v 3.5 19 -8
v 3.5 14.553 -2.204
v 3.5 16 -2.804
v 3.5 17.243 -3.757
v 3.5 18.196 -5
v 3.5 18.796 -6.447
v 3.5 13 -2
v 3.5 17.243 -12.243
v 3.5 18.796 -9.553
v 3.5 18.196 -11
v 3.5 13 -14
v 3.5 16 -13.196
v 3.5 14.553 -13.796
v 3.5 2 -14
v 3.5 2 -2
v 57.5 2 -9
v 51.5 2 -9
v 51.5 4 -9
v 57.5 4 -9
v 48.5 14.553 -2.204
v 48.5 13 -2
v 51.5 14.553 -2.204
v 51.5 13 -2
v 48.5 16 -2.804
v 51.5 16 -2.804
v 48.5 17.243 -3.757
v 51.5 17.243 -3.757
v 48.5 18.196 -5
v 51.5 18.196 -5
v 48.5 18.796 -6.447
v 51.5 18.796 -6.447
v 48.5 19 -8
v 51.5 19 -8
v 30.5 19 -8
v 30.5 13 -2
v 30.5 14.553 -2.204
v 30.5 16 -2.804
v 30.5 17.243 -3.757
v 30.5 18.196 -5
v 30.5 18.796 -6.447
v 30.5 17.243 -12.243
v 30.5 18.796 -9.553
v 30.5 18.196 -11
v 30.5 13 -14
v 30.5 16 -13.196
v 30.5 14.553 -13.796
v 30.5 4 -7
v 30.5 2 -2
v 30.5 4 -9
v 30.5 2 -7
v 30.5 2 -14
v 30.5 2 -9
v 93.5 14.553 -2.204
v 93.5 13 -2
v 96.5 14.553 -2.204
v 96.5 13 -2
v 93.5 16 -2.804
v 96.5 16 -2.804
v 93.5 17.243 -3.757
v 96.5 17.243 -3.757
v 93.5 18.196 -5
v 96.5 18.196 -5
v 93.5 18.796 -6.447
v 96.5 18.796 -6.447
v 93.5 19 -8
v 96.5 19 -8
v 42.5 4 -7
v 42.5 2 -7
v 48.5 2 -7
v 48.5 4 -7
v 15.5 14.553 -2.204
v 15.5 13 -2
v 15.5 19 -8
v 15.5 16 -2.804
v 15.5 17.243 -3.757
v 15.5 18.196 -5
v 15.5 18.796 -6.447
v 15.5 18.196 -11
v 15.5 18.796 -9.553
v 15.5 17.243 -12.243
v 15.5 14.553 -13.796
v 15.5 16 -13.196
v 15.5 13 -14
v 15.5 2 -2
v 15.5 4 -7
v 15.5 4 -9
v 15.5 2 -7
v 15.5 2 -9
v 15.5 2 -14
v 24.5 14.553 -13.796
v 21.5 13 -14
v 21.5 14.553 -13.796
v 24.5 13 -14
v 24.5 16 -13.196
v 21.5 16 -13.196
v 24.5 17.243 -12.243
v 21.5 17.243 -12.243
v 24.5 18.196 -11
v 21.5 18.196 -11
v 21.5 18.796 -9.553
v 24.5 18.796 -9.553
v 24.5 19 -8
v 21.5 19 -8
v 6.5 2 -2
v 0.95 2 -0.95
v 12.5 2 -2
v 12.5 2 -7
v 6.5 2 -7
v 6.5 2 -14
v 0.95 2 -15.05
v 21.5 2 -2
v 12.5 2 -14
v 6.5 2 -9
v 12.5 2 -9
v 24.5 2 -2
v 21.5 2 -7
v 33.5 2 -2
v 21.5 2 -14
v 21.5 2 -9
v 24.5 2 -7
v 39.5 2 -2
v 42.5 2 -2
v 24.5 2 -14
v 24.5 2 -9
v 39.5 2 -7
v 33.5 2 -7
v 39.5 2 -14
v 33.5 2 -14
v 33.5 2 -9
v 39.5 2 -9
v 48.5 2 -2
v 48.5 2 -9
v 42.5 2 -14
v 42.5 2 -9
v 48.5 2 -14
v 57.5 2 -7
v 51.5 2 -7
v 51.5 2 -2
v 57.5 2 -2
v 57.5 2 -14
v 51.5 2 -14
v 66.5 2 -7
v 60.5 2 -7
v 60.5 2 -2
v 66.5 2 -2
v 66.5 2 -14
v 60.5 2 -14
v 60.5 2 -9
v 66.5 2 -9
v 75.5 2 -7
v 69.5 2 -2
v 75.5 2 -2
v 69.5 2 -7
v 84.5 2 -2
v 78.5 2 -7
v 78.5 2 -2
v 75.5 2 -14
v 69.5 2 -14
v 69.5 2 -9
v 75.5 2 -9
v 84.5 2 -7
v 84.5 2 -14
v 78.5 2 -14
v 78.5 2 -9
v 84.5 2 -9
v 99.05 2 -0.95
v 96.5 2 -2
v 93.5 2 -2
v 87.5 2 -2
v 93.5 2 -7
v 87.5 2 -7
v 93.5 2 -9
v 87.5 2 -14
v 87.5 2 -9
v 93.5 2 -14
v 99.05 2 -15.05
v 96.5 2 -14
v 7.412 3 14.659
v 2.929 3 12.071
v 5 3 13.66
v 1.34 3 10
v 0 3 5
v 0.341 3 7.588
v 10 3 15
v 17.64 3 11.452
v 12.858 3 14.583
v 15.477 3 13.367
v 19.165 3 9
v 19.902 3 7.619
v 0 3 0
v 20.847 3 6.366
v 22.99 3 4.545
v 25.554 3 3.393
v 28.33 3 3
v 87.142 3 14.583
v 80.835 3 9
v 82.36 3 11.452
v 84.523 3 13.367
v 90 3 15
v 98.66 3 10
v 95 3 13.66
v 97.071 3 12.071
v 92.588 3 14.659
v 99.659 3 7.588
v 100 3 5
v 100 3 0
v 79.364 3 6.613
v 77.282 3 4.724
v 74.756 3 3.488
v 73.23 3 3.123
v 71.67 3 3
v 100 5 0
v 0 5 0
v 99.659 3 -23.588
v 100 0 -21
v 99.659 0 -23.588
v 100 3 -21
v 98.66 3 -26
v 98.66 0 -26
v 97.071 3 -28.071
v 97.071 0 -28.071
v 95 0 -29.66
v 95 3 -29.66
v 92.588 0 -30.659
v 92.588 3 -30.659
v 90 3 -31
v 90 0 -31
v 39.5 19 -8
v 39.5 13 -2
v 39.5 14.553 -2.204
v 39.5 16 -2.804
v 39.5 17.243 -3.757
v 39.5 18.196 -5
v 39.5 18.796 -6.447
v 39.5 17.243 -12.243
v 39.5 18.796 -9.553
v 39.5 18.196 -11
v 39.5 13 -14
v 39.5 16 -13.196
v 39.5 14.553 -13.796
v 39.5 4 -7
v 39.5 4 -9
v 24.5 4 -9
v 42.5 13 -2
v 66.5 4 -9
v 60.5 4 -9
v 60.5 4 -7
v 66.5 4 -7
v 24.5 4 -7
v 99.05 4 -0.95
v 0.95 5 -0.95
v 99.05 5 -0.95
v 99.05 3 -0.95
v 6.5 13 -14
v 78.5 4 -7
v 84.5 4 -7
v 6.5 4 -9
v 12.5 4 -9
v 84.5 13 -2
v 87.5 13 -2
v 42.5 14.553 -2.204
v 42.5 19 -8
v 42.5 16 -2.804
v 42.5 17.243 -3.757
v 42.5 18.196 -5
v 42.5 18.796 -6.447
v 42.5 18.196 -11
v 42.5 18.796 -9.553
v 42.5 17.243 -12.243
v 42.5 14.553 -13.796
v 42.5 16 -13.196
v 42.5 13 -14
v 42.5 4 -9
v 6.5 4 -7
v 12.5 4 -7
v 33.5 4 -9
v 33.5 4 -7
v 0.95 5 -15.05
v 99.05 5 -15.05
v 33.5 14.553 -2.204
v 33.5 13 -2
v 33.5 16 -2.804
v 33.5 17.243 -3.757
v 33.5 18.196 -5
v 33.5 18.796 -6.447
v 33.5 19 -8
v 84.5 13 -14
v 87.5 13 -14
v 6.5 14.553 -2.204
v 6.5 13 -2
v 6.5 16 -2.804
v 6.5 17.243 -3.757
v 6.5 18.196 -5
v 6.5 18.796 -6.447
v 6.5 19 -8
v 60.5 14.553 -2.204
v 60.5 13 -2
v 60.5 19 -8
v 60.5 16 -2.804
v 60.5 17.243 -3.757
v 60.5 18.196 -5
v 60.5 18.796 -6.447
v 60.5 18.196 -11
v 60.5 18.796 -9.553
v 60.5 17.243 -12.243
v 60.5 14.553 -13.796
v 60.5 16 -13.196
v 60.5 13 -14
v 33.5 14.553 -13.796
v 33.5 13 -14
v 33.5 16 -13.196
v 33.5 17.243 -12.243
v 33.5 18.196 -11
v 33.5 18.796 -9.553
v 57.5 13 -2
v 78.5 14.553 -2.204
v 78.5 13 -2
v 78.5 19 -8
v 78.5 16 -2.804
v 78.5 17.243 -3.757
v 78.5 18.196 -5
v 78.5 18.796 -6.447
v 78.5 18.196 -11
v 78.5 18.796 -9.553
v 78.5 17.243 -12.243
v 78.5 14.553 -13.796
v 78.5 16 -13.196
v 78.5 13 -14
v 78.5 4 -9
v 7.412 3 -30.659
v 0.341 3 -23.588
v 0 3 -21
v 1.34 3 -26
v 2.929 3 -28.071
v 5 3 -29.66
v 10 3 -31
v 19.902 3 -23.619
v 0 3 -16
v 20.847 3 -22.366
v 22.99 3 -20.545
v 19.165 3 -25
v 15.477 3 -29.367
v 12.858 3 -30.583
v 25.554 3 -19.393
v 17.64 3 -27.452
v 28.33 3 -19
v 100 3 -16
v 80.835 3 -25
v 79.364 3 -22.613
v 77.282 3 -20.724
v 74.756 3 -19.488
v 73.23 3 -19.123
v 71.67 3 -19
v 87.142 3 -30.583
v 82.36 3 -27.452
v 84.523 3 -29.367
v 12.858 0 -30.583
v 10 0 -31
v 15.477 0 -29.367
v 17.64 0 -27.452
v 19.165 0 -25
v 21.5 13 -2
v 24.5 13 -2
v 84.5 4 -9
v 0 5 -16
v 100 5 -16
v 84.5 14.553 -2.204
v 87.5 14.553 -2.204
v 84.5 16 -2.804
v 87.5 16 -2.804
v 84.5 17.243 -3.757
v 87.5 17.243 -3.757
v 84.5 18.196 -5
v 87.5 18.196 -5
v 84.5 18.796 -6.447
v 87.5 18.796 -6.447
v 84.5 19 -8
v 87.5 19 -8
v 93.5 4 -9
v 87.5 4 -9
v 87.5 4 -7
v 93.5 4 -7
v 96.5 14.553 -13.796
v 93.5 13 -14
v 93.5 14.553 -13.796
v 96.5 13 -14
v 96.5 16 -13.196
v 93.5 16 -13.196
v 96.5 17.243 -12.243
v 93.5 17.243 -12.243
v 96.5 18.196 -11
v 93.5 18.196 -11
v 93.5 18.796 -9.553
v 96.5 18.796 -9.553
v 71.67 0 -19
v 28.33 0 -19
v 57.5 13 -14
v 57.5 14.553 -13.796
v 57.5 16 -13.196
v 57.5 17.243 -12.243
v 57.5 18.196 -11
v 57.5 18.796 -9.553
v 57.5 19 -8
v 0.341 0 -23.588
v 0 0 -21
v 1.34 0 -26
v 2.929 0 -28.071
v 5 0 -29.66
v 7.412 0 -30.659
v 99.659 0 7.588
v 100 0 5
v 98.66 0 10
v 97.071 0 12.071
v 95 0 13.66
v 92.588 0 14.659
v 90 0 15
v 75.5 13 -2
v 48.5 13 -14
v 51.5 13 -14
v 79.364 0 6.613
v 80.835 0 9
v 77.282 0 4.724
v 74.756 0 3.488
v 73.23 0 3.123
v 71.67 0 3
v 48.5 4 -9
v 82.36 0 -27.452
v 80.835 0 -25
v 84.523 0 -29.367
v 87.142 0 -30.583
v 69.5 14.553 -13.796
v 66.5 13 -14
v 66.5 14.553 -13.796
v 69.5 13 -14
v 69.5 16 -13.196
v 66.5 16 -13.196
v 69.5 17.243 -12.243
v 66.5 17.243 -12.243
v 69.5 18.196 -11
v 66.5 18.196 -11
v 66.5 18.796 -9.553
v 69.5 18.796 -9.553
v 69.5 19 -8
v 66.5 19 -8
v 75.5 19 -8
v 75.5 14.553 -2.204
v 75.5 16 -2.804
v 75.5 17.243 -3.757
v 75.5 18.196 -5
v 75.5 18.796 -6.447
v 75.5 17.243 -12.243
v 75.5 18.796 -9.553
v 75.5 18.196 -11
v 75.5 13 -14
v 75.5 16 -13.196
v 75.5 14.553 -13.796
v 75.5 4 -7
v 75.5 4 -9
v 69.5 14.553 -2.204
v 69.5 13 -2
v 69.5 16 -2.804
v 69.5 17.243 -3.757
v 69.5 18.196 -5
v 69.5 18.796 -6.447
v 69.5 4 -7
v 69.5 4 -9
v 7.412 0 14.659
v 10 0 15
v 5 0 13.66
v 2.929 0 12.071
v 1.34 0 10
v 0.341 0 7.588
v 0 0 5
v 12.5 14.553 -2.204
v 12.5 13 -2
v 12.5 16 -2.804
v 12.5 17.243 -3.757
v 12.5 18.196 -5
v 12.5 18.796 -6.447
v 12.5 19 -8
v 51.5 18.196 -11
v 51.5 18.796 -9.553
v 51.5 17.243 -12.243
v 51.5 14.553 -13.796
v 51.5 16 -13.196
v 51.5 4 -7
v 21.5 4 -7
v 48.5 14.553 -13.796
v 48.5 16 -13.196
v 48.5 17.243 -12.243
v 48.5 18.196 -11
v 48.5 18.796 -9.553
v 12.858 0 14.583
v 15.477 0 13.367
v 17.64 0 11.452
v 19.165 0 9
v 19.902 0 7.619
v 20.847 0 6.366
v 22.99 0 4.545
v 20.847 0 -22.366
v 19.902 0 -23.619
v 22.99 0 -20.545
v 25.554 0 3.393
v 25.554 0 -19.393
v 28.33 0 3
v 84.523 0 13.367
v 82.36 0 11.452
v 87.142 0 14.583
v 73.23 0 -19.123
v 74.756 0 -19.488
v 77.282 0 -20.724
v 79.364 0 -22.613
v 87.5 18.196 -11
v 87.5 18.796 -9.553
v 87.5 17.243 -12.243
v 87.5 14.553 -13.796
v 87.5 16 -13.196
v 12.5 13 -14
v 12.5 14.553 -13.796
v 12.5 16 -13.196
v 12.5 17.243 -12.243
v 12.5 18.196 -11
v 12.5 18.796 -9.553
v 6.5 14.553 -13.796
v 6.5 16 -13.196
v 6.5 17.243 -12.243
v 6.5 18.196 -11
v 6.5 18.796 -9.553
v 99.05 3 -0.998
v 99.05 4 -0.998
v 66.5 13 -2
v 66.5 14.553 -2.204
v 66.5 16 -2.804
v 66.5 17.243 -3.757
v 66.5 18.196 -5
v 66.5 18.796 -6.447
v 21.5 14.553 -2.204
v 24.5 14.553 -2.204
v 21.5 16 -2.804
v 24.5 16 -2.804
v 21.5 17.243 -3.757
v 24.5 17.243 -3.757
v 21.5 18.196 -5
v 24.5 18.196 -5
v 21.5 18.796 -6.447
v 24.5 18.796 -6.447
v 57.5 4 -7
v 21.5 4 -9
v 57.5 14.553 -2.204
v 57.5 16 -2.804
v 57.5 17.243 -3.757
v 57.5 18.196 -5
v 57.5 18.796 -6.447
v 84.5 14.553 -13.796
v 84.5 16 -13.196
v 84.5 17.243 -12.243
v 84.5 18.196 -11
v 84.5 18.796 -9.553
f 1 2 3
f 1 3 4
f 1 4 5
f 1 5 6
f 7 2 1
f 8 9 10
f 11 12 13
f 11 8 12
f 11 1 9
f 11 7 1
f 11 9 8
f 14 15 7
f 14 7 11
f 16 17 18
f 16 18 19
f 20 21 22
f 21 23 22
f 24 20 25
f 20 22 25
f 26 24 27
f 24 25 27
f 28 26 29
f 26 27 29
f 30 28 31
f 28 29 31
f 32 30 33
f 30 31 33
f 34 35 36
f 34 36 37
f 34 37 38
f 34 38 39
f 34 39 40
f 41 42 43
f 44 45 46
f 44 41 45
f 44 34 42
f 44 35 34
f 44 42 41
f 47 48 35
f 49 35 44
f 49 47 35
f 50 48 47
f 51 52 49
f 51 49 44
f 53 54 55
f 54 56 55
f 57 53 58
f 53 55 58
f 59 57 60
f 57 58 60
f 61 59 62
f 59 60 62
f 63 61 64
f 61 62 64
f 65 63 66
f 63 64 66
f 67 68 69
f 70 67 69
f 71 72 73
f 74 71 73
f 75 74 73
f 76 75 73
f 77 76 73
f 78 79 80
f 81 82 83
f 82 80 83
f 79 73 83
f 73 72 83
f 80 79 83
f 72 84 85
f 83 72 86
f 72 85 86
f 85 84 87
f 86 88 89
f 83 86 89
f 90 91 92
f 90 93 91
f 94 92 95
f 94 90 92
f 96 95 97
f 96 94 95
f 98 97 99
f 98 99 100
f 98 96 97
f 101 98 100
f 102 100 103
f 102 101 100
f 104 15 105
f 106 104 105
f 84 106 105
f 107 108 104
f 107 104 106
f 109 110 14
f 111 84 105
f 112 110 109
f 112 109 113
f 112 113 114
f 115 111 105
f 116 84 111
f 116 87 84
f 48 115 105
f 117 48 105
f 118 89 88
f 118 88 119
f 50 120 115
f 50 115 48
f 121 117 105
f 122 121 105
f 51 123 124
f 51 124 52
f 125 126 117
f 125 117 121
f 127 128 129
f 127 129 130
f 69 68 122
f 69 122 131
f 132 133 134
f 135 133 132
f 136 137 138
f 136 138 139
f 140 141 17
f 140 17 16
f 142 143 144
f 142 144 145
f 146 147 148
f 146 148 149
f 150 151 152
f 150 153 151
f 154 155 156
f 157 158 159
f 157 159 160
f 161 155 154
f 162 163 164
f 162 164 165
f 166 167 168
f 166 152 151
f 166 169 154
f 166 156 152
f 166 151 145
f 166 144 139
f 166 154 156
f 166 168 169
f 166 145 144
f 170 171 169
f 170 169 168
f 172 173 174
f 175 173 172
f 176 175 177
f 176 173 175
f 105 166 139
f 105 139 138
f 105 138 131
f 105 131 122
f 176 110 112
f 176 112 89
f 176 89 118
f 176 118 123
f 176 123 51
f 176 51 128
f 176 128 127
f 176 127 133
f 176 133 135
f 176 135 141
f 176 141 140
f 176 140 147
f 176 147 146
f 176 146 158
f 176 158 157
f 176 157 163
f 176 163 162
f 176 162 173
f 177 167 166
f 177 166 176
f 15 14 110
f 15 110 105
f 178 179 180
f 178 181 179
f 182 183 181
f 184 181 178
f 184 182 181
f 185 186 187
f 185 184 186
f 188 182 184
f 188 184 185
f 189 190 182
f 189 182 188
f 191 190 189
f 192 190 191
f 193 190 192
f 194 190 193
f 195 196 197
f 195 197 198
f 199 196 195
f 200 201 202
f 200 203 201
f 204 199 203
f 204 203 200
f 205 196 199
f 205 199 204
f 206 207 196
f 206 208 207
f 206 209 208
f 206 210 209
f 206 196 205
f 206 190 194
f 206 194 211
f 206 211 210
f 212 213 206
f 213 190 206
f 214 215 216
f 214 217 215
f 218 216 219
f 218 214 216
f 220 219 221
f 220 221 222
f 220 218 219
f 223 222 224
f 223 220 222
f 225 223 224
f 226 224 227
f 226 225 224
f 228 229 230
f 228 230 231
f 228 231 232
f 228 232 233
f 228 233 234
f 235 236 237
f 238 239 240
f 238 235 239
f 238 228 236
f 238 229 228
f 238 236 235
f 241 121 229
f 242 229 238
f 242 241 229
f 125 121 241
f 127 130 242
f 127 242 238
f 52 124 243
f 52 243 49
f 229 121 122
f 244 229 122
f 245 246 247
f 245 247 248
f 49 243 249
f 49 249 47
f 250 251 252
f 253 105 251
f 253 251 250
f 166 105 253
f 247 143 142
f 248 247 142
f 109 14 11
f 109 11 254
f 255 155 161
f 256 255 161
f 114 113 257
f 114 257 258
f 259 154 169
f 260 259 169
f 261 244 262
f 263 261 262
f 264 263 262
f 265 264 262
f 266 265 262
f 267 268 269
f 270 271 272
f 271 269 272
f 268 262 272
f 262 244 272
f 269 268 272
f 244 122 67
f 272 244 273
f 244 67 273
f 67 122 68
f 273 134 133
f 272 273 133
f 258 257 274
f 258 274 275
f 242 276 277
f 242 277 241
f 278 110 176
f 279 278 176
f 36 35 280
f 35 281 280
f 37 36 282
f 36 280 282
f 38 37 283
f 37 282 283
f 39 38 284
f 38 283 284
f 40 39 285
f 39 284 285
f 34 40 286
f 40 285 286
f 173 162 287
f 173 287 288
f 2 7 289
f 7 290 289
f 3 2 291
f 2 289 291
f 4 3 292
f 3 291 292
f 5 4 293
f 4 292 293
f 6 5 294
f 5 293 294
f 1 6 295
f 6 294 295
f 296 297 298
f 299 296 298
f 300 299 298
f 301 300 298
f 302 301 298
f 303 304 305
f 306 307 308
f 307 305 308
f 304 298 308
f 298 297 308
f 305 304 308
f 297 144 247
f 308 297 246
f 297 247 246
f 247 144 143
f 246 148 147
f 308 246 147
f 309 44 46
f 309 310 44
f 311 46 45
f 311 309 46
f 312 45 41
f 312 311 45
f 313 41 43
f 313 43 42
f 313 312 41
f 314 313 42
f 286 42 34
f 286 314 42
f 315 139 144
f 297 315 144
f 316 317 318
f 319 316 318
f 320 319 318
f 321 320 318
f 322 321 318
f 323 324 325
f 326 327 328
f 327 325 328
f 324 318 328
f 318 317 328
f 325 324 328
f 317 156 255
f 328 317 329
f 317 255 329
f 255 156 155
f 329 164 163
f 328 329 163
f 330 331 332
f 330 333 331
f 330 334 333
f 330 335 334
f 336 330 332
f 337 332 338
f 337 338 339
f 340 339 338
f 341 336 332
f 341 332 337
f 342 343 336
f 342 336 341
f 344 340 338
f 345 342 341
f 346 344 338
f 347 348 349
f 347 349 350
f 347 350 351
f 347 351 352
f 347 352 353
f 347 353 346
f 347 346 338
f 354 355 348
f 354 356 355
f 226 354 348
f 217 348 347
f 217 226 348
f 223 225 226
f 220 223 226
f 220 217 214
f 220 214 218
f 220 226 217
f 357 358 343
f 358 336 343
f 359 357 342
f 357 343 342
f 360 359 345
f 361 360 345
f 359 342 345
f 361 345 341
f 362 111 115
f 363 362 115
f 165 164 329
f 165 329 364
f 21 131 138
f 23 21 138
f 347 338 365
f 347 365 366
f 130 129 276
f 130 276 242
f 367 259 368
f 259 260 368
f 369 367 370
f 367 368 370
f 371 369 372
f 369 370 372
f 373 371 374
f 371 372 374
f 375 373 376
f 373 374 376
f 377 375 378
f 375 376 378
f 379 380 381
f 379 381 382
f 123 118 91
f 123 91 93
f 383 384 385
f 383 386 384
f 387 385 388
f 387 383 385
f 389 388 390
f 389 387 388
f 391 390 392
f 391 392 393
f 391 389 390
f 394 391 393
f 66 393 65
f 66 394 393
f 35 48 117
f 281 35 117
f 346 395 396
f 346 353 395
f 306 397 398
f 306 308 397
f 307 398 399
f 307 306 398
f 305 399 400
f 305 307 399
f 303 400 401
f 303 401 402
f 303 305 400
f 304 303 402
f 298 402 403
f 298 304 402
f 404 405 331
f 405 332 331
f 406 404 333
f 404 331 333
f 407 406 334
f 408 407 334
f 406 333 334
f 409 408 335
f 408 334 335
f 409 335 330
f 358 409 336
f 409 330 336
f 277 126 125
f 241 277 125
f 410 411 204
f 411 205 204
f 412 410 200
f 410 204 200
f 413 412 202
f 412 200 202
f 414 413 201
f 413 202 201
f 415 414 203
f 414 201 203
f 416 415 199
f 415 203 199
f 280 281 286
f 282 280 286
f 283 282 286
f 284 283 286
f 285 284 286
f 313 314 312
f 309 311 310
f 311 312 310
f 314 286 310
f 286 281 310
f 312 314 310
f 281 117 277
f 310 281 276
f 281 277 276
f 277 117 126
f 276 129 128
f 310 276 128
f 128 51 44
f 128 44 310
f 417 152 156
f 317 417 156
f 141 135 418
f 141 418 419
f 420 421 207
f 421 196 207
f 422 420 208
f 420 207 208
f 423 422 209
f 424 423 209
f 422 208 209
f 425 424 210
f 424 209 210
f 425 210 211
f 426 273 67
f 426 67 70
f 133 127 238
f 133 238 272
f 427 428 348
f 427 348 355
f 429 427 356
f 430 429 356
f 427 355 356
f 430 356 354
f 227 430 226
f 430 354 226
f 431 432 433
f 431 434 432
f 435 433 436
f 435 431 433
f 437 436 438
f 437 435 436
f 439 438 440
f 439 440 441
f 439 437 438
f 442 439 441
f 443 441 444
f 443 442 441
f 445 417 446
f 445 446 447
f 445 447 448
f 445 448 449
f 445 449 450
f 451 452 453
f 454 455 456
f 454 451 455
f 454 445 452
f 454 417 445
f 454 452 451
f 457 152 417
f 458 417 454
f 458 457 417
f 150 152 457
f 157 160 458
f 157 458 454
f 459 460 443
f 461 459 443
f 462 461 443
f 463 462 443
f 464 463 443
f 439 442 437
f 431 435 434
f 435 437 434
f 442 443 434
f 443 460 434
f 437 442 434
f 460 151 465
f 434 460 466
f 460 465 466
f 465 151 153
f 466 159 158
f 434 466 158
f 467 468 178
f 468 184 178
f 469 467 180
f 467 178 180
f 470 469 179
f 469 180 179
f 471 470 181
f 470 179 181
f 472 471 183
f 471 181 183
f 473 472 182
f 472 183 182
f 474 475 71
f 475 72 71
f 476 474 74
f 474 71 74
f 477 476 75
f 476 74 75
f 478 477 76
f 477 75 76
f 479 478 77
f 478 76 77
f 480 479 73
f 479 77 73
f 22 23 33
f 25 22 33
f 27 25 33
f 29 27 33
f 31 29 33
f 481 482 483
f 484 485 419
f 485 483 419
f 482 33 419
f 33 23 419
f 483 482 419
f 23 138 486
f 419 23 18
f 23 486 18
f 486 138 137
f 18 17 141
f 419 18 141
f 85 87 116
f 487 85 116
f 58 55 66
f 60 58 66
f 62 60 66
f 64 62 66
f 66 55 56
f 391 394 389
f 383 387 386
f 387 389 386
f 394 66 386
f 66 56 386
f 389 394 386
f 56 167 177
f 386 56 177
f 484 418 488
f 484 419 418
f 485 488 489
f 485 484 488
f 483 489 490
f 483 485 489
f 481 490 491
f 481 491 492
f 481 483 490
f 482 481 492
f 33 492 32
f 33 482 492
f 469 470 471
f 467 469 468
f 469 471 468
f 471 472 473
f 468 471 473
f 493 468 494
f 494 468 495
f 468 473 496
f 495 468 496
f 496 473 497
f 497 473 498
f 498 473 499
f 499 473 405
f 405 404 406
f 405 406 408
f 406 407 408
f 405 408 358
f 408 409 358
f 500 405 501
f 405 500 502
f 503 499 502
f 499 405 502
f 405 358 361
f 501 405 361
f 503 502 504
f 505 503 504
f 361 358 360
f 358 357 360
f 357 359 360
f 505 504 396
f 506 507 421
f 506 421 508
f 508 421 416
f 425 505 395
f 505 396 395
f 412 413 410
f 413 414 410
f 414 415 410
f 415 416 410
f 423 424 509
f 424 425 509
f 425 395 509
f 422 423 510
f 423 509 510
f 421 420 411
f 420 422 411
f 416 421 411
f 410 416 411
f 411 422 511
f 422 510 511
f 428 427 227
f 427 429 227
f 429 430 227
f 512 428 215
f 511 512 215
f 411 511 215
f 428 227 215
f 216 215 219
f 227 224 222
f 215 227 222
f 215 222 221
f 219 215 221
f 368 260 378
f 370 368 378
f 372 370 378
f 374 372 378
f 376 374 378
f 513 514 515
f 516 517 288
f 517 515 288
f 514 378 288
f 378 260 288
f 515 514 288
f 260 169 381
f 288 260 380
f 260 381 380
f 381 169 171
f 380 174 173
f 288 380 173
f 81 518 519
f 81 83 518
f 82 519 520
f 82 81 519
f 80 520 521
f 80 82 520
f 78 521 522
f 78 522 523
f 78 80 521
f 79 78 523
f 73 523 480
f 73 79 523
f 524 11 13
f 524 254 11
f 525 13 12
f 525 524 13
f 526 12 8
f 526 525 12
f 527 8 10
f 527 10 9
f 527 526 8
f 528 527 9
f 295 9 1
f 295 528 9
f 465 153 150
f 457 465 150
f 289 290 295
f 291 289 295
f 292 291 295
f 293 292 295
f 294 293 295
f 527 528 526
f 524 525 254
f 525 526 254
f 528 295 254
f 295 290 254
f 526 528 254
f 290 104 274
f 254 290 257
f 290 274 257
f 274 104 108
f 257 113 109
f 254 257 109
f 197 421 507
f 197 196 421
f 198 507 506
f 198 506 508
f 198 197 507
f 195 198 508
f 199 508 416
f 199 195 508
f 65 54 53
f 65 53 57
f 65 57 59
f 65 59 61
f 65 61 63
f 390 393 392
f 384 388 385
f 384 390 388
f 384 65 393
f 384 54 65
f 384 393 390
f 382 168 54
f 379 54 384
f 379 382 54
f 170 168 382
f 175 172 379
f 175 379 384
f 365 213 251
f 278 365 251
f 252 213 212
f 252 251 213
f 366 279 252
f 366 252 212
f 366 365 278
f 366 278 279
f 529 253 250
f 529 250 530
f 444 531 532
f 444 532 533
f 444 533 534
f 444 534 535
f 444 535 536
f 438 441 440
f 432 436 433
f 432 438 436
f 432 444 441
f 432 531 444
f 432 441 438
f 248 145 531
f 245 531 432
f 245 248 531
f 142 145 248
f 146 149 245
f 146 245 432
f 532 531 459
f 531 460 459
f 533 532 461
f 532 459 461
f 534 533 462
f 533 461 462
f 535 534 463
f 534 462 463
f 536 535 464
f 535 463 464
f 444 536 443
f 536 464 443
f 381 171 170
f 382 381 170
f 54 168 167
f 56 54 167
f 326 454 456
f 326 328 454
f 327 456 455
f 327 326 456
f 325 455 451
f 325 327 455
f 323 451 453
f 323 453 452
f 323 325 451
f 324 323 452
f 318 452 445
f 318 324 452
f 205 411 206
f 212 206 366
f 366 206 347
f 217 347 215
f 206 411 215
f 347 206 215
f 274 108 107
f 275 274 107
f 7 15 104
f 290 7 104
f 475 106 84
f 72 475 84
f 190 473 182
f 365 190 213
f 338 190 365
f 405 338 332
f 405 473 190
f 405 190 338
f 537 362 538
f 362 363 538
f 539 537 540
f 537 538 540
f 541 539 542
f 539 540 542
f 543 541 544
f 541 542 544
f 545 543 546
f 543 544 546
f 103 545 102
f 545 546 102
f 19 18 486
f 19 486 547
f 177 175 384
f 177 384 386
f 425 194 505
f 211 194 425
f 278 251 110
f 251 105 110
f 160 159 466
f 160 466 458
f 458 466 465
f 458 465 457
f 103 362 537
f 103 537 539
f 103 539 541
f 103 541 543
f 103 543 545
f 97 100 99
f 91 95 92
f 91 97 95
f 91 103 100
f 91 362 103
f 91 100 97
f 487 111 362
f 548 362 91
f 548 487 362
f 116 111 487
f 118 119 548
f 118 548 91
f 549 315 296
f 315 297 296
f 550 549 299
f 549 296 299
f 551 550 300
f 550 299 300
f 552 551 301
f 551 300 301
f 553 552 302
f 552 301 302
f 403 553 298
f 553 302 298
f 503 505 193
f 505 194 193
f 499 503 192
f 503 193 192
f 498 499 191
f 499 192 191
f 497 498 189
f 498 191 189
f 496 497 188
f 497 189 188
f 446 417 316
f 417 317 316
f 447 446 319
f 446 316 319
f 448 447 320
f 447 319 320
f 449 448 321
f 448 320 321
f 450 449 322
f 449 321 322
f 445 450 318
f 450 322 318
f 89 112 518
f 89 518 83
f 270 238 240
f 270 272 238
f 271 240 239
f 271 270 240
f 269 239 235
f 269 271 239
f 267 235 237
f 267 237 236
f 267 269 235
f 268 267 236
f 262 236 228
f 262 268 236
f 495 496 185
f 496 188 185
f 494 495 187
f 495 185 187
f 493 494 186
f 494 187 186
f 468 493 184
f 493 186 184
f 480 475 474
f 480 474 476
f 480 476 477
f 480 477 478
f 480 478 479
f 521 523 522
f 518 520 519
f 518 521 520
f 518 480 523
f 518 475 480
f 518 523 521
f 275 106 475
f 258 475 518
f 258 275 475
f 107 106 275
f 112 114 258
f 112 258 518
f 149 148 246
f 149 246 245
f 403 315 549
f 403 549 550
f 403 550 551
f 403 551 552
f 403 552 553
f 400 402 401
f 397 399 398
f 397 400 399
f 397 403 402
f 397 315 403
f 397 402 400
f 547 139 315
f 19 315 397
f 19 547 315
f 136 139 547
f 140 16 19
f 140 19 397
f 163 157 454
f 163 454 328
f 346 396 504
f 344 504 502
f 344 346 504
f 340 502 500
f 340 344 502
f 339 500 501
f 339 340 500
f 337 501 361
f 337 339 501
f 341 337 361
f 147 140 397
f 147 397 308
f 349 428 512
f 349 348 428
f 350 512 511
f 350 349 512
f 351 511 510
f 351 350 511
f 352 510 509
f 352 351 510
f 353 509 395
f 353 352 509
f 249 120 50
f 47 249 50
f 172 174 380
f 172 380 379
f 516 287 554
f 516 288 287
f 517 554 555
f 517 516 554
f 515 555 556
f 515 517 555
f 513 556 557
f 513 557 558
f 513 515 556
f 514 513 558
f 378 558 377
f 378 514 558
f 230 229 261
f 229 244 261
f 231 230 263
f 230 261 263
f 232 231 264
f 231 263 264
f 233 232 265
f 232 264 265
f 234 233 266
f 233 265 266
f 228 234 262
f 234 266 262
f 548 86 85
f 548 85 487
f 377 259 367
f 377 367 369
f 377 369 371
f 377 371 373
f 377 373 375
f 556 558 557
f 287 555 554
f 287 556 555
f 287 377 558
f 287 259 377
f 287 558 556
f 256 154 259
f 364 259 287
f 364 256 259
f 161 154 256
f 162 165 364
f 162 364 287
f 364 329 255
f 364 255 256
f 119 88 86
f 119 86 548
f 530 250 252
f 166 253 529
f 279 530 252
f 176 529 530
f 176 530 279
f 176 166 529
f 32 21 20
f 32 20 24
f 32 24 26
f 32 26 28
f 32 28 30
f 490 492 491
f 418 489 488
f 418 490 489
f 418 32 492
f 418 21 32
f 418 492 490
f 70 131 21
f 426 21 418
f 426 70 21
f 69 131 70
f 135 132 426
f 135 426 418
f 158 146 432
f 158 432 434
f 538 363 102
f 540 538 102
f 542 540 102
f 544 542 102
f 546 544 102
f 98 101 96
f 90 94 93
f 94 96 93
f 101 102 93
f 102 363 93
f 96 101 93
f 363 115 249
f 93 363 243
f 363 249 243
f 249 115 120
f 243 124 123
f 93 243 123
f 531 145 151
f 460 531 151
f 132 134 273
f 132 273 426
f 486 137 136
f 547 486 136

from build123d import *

# Parameters (mm, degrees)
SKETCH1_W            = 100
SKETCH1_H            = 16
BOSS_EXTRUDE1_DEPTH  = 3
SKETCH2_W            = 98
SKETCH2_H            = 14
CUT_EXTRUDE1_DEPTH   = 1
SKETCH5_W            = 20
SKETCH5_H            = 3
BOSS_EXTRUDE4_DEPTH  = 15
SKETCH6_W            = 20
SKETCH6_H            = 3
BOSS_EXTRUDE5_DEPTH  = 15
FILLET18_R           = 10
SKETCH7_W            = 3
SKETCH7_H            = 12
BOSS_EXTRUDE6_DEPTH  = 17
SKETCH8_W            = 6
SKETCH8_H            = 2
BOSS_EXTRUDE7_DEPTH  = 2
FILLET19_R           = 6
SKETCH10_W           = 60
SKETCH10_H           = 3
BOSS_EXTRUDE8_DEPTH  = 3
SKETCH11_W           = 60
SKETCH11_H           = 3
BOSS_EXTRUDE9_DEPTH  = 3
SKETCH12_W           = 0.95
SKETCH12_H           = 14
BOSS_EXTRUDE10_DEPTH = 3
SKETCH13_W           = 100
SKETCH13_H           = 0.95
BOSS_EXTRUDE11_DEPTH = 3
SKETCH14_W           = 0.95
SKETCH14_H           = 0.052088128
BOSS_EXTRUDE12_DEPTH = 3
SKETCH15_W           = 0.95
SKETCH15_H           = 0.047911872
SKETCH15_W_2         = 0.949734752
SKETCH15_H_2         = 0.052088128
BOSS_EXTRUDE13_DEPTH = 3
FILLET20_R           = 10
SKETCH17_W           = 98.1
SKETCH17_H           = 14.1
SKETCH17_W_2         = 97.1
SKETCH17_H_2         = 13.1
CUT_EXTRUDE2_DEPTH   = 4
SKETCH18_W           = 100
SKETCH18_H           = 16.05
SKETCH18_W_2         = 98
SKETCH18_H_2         = 14.05
CUT_EXTRUDE3_DEPTH   = 2
SKETCH19_W           = 100
SKETCH19_H           = 16
SKETCH19_W_2         = 98.1
SKETCH19_H_2         = 14.1
BOSS_EXTRUDE14_DEPTH = 1


with BuildPart() as part:
    # Sketch1 → Boss-Extrude1 (new body)
    with BuildSketch(Plane(origin=(0, 0, 0), x_dir=(1, 0, 0), z_dir=(0, 1, 0))):
        with Locations((50, 8)):
            Rectangle(SKETCH1_W, SKETCH1_H)
    extrude(amount=BOSS_EXTRUDE1_DEPTH)

    # Sketch2 → Cut-Extrude1 (cut)
    with BuildSketch(Plane(origin=(0, 3, 0), x_dir=(1, 0, 0), z_dir=(0, 1, 0))):
        with Locations((50, 8)):
            Rectangle(SKETCH2_W, SKETCH2_H)
    extrude(amount=-CUT_EXTRUDE1_DEPTH, mode=Mode.SUBTRACT)

    # Sketch5 → Boss-Extrude4 (add)
    with BuildSketch(Plane.XY):
        with Locations((10, 1.5)):
            Rectangle(SKETCH5_W, SKETCH5_H)
        with Locations((90, 1.5)):
            Rectangle(SKETCH5_W, SKETCH5_H)
    extrude(amount=BOSS_EXTRUDE4_DEPTH)

    # Sketch6 → Boss-Extrude5 (add)
    with BuildSketch(Plane(origin=(0, 0, -16), x_dir=(-1, 0, 0), z_dir=(0, 0, -1))):
        with Locations((-90, 1.5)):
            Rectangle(SKETCH6_W, SKETCH6_H)
        with Locations((-10, 1.5)):
            Rectangle(SKETCH6_W, SKETCH6_H)
    extrude(amount=BOSS_EXTRUDE5_DEPTH)

    # Fillet18
    fillet18_edges = [part.edges().sort_by_distance(p)[0] for p in [
        (20, 1.5, 15),
        (0, 1.5, 15),
        (80, 1.5, 15),
        (100, 1.5, 15),
        (0, 1.5, -31),
        (20, 1.5, -31),
        (80, 1.5, -31),
        (100, 1.5, -31),
    ]]
    fillet(fillet18_edges, radius=FILLET18_R - 0.0001)  # a hair under: the kernel refuses the full size

    # Sketch7 → Boss-Extrude6 (add)
    with BuildSketch(Plane(origin=(0, 2, 0), x_dir=(1, 0, 0), z_dir=(0, 1, 0))):
        with Locations((95, 8)):
            Rectangle(SKETCH7_W, SKETCH7_H)
        with Locations((86, 8)):
            Rectangle(SKETCH7_W, SKETCH7_H)
        with Locations((77, 8)):
            Rectangle(SKETCH7_W, SKETCH7_H)
        with Locations((68, 8)):
            Rectangle(SKETCH7_W, SKETCH7_H)
        with Locations((59, 8)):
            Rectangle(SKETCH7_W, SKETCH7_H)
        with Locations((50, 8)):
            Rectangle(SKETCH7_W, SKETCH7_H)
        with Locations((41, 8)):
            Rectangle(SKETCH7_W, SKETCH7_H)
        with Locations((32, 8)):
            Rectangle(SKETCH7_W, SKETCH7_H)
        with Locations((23, 8)):
            Rectangle(SKETCH7_W, SKETCH7_H)
        with Locations((14, 8)):
            Rectangle(SKETCH7_W, SKETCH7_H)
        with Locations((5, 8)):
            Rectangle(SKETCH7_W, SKETCH7_H)
    extrude(amount=BOSS_EXTRUDE6_DEPTH)

    # Sketch8 → Boss-Extrude7 (add)
    with BuildSketch(Plane(origin=(0, 2, 0), x_dir=(1, 0, 0), z_dir=(0, 1, 0))):
        with Locations((90.5, 8)):
            Rectangle(SKETCH8_W, SKETCH8_H)
        with Locations((81.5, 8)):
            Rectangle(SKETCH8_W, SKETCH8_H)
        with Locations((72.5, 8)):
            Rectangle(SKETCH8_W, SKETCH8_H)
        with Locations((63.5, 8)):
            Rectangle(SKETCH8_W, SKETCH8_H)
        with Locations((54.5, 8)):
            Rectangle(SKETCH8_W, SKETCH8_H)
        with Locations((45.5, 8)):
            Rectangle(SKETCH8_W, SKETCH8_H)
        with Locations((36.5, 8)):
            Rectangle(SKETCH8_W, SKETCH8_H)
        with Locations((27.5, 8)):
            Rectangle(SKETCH8_W, SKETCH8_H)
        with Locations((18.5, 8)):
            Rectangle(SKETCH8_W, SKETCH8_H)
        with Locations((9.5, 8)):
            Rectangle(SKETCH8_W, SKETCH8_H)
    extrude(amount=BOSS_EXTRUDE7_DEPTH)

    # Fillet19
    fillet19_edges = [part.edges().sort_by_distance(p)[0] for p in [
        (95, 19, -2),
        (95, 19, -14),
        (86, 19, -2),
        (86, 19, -14),
        (77, 19, -2),
        (77, 19, -14),
        (68, 19, -2),
        (68, 19, -14),
        (59, 19, -2),
        (59, 19, -14),
        (50, 19, -2),
        (50, 19, -14),
        (41, 19, -2),
        (41, 19, -14),
        (32, 19, -2),
        (32, 19, -14),
        (23, 19, -14),
        (23, 19, -2),
        (14, 19, -2),
        (14, 19, -14),
        (5, 19, -2),
        (5, 19, -14),
    ]]
    fillet(fillet19_edges, radius=FILLET19_R - 0.0001)  # a hair under: the kernel refuses the full size

    # Sketch10 → Boss-Extrude8 (add)
    with BuildSketch(Plane(origin=(0, 0, -16), x_dir=(-1, 0, 0), z_dir=(0, 0, -1))):
        with Locations((-50, 1.5)):
            Rectangle(SKETCH10_W, SKETCH10_H)
    extrude(amount=BOSS_EXTRUDE8_DEPTH)

    # Sketch11 → Boss-Extrude9 (add)
    with BuildSketch(Plane.XY):
        with Locations((50, 1.5)):
            Rectangle(SKETCH11_W, SKETCH11_H)
    extrude(amount=BOSS_EXTRUDE9_DEPTH)

    # Sketch12 → Boss-Extrude10 (add)
    with BuildSketch(Plane(origin=(0, 3, 0), x_dir=(1, 0, 0), z_dir=(0, 1, 0))):
        with Locations((99.525, 7.997911872)):
            Rectangle(SKETCH12_W, SKETCH12_H)
        with Locations((0.475, 7.997911872)):
            Rectangle(SKETCH12_W, SKETCH12_H)
    extrude(amount=BOSS_EXTRUDE10_DEPTH)

    # Sketch13 → Boss-Extrude11 (add)
    with BuildSketch(Plane(origin=(0, 3, 0), x_dir=(1, 0, 0), z_dir=(0, 1, 0))):
        with Locations((50, 15.525)):
            Rectangle(SKETCH13_W, SKETCH13_H)
        with Locations((50, 0.475)):
            Rectangle(SKETCH13_W, SKETCH13_H)
    extrude(amount=BOSS_EXTRUDE11_DEPTH)

    # Sketch14 → Boss-Extrude12 (add)
    with BuildSketch(Plane(origin=(0, 3, 0), x_dir=(1, 0, 0), z_dir=(0, 1, 0))):
        with Locations((0.475, 15.023955936)):
            Rectangle(SKETCH14_W, SKETCH14_H)
    extrude(amount=BOSS_EXTRUDE12_DEPTH)

    # Sketch15 → Boss-Extrude13 (add)
    with BuildSketch(Plane(origin=(0, 3, 0), x_dir=(1, 0, 0), z_dir=(0, 1, 0))):
        with Locations((0.475, 0.973955936)):
            Rectangle(SKETCH15_W, SKETCH15_H)
        with Locations((99.525132624, 0.973955936)):
            Rectangle(SKETCH15_W_2, SKETCH15_H)
        with Locations((99.525, 15.023955936)):
            Rectangle(SKETCH15_W, SKETCH15_H_2)
    extrude(amount=BOSS_EXTRUDE13_DEPTH)

    # Fillet20
    fillet20_edges = [part.edges().sort_by_distance(p)[0] for p in [
        (20, 1.5, -19),
        (80, 1.5, -19),
        (80, 1.5, 3),
        (20, 1.5, 3),
    ]]
    fillet(fillet20_edges, radius=FILLET20_R)

    # Sketch17 → Cut-Extrude2 (cut)
    with BuildSketch(Plane(origin=(0, 6, 0), x_dir=(1, 0, 0), z_dir=(0, 1, 0))):
        with Locations((50, 8)):
            Rectangle(SKETCH17_W, SKETCH17_H)
        with Locations((50, 8)):
            Rectangle(SKETCH17_W_2, SKETCH17_H_2, mode=Mode.SUBTRACT)
    extrude(amount=-CUT_EXTRUDE2_DEPTH, mode=Mode.SUBTRACT)

    # Sketch18 → Cut-Extrude3 (cut)
    with BuildSketch(Plane(origin=(0, 6, 0), x_dir=(1, 0, 0), z_dir=(0, 1, 0))):
        with Locations((50, 7.975)):
            Rectangle(SKETCH18_W, SKETCH18_H)
        with Locations((50, 7.975)):
            Rectangle(SKETCH18_W_2, SKETCH18_H_2, mode=Mode.SUBTRACT)
    extrude(amount=-CUT_EXTRUDE3_DEPTH, mode=Mode.SUBTRACT)

    # Sketch19 → Boss-Extrude14 (add)
    with BuildSketch(Plane(origin=(0, 4, 0), x_dir=(1, 0, 0), z_dir=(0, 1, 0))):
        with Locations((50, 8)):
            Rectangle(SKETCH19_W, SKETCH19_H)
        with Locations((50, 8)):
            Rectangle(SKETCH19_W_2, SKETCH19_H_2, mode=Mode.SUBTRACT)
    extrude(amount=BOSS_EXTRUDE14_DEPTH)


solid = part.part
